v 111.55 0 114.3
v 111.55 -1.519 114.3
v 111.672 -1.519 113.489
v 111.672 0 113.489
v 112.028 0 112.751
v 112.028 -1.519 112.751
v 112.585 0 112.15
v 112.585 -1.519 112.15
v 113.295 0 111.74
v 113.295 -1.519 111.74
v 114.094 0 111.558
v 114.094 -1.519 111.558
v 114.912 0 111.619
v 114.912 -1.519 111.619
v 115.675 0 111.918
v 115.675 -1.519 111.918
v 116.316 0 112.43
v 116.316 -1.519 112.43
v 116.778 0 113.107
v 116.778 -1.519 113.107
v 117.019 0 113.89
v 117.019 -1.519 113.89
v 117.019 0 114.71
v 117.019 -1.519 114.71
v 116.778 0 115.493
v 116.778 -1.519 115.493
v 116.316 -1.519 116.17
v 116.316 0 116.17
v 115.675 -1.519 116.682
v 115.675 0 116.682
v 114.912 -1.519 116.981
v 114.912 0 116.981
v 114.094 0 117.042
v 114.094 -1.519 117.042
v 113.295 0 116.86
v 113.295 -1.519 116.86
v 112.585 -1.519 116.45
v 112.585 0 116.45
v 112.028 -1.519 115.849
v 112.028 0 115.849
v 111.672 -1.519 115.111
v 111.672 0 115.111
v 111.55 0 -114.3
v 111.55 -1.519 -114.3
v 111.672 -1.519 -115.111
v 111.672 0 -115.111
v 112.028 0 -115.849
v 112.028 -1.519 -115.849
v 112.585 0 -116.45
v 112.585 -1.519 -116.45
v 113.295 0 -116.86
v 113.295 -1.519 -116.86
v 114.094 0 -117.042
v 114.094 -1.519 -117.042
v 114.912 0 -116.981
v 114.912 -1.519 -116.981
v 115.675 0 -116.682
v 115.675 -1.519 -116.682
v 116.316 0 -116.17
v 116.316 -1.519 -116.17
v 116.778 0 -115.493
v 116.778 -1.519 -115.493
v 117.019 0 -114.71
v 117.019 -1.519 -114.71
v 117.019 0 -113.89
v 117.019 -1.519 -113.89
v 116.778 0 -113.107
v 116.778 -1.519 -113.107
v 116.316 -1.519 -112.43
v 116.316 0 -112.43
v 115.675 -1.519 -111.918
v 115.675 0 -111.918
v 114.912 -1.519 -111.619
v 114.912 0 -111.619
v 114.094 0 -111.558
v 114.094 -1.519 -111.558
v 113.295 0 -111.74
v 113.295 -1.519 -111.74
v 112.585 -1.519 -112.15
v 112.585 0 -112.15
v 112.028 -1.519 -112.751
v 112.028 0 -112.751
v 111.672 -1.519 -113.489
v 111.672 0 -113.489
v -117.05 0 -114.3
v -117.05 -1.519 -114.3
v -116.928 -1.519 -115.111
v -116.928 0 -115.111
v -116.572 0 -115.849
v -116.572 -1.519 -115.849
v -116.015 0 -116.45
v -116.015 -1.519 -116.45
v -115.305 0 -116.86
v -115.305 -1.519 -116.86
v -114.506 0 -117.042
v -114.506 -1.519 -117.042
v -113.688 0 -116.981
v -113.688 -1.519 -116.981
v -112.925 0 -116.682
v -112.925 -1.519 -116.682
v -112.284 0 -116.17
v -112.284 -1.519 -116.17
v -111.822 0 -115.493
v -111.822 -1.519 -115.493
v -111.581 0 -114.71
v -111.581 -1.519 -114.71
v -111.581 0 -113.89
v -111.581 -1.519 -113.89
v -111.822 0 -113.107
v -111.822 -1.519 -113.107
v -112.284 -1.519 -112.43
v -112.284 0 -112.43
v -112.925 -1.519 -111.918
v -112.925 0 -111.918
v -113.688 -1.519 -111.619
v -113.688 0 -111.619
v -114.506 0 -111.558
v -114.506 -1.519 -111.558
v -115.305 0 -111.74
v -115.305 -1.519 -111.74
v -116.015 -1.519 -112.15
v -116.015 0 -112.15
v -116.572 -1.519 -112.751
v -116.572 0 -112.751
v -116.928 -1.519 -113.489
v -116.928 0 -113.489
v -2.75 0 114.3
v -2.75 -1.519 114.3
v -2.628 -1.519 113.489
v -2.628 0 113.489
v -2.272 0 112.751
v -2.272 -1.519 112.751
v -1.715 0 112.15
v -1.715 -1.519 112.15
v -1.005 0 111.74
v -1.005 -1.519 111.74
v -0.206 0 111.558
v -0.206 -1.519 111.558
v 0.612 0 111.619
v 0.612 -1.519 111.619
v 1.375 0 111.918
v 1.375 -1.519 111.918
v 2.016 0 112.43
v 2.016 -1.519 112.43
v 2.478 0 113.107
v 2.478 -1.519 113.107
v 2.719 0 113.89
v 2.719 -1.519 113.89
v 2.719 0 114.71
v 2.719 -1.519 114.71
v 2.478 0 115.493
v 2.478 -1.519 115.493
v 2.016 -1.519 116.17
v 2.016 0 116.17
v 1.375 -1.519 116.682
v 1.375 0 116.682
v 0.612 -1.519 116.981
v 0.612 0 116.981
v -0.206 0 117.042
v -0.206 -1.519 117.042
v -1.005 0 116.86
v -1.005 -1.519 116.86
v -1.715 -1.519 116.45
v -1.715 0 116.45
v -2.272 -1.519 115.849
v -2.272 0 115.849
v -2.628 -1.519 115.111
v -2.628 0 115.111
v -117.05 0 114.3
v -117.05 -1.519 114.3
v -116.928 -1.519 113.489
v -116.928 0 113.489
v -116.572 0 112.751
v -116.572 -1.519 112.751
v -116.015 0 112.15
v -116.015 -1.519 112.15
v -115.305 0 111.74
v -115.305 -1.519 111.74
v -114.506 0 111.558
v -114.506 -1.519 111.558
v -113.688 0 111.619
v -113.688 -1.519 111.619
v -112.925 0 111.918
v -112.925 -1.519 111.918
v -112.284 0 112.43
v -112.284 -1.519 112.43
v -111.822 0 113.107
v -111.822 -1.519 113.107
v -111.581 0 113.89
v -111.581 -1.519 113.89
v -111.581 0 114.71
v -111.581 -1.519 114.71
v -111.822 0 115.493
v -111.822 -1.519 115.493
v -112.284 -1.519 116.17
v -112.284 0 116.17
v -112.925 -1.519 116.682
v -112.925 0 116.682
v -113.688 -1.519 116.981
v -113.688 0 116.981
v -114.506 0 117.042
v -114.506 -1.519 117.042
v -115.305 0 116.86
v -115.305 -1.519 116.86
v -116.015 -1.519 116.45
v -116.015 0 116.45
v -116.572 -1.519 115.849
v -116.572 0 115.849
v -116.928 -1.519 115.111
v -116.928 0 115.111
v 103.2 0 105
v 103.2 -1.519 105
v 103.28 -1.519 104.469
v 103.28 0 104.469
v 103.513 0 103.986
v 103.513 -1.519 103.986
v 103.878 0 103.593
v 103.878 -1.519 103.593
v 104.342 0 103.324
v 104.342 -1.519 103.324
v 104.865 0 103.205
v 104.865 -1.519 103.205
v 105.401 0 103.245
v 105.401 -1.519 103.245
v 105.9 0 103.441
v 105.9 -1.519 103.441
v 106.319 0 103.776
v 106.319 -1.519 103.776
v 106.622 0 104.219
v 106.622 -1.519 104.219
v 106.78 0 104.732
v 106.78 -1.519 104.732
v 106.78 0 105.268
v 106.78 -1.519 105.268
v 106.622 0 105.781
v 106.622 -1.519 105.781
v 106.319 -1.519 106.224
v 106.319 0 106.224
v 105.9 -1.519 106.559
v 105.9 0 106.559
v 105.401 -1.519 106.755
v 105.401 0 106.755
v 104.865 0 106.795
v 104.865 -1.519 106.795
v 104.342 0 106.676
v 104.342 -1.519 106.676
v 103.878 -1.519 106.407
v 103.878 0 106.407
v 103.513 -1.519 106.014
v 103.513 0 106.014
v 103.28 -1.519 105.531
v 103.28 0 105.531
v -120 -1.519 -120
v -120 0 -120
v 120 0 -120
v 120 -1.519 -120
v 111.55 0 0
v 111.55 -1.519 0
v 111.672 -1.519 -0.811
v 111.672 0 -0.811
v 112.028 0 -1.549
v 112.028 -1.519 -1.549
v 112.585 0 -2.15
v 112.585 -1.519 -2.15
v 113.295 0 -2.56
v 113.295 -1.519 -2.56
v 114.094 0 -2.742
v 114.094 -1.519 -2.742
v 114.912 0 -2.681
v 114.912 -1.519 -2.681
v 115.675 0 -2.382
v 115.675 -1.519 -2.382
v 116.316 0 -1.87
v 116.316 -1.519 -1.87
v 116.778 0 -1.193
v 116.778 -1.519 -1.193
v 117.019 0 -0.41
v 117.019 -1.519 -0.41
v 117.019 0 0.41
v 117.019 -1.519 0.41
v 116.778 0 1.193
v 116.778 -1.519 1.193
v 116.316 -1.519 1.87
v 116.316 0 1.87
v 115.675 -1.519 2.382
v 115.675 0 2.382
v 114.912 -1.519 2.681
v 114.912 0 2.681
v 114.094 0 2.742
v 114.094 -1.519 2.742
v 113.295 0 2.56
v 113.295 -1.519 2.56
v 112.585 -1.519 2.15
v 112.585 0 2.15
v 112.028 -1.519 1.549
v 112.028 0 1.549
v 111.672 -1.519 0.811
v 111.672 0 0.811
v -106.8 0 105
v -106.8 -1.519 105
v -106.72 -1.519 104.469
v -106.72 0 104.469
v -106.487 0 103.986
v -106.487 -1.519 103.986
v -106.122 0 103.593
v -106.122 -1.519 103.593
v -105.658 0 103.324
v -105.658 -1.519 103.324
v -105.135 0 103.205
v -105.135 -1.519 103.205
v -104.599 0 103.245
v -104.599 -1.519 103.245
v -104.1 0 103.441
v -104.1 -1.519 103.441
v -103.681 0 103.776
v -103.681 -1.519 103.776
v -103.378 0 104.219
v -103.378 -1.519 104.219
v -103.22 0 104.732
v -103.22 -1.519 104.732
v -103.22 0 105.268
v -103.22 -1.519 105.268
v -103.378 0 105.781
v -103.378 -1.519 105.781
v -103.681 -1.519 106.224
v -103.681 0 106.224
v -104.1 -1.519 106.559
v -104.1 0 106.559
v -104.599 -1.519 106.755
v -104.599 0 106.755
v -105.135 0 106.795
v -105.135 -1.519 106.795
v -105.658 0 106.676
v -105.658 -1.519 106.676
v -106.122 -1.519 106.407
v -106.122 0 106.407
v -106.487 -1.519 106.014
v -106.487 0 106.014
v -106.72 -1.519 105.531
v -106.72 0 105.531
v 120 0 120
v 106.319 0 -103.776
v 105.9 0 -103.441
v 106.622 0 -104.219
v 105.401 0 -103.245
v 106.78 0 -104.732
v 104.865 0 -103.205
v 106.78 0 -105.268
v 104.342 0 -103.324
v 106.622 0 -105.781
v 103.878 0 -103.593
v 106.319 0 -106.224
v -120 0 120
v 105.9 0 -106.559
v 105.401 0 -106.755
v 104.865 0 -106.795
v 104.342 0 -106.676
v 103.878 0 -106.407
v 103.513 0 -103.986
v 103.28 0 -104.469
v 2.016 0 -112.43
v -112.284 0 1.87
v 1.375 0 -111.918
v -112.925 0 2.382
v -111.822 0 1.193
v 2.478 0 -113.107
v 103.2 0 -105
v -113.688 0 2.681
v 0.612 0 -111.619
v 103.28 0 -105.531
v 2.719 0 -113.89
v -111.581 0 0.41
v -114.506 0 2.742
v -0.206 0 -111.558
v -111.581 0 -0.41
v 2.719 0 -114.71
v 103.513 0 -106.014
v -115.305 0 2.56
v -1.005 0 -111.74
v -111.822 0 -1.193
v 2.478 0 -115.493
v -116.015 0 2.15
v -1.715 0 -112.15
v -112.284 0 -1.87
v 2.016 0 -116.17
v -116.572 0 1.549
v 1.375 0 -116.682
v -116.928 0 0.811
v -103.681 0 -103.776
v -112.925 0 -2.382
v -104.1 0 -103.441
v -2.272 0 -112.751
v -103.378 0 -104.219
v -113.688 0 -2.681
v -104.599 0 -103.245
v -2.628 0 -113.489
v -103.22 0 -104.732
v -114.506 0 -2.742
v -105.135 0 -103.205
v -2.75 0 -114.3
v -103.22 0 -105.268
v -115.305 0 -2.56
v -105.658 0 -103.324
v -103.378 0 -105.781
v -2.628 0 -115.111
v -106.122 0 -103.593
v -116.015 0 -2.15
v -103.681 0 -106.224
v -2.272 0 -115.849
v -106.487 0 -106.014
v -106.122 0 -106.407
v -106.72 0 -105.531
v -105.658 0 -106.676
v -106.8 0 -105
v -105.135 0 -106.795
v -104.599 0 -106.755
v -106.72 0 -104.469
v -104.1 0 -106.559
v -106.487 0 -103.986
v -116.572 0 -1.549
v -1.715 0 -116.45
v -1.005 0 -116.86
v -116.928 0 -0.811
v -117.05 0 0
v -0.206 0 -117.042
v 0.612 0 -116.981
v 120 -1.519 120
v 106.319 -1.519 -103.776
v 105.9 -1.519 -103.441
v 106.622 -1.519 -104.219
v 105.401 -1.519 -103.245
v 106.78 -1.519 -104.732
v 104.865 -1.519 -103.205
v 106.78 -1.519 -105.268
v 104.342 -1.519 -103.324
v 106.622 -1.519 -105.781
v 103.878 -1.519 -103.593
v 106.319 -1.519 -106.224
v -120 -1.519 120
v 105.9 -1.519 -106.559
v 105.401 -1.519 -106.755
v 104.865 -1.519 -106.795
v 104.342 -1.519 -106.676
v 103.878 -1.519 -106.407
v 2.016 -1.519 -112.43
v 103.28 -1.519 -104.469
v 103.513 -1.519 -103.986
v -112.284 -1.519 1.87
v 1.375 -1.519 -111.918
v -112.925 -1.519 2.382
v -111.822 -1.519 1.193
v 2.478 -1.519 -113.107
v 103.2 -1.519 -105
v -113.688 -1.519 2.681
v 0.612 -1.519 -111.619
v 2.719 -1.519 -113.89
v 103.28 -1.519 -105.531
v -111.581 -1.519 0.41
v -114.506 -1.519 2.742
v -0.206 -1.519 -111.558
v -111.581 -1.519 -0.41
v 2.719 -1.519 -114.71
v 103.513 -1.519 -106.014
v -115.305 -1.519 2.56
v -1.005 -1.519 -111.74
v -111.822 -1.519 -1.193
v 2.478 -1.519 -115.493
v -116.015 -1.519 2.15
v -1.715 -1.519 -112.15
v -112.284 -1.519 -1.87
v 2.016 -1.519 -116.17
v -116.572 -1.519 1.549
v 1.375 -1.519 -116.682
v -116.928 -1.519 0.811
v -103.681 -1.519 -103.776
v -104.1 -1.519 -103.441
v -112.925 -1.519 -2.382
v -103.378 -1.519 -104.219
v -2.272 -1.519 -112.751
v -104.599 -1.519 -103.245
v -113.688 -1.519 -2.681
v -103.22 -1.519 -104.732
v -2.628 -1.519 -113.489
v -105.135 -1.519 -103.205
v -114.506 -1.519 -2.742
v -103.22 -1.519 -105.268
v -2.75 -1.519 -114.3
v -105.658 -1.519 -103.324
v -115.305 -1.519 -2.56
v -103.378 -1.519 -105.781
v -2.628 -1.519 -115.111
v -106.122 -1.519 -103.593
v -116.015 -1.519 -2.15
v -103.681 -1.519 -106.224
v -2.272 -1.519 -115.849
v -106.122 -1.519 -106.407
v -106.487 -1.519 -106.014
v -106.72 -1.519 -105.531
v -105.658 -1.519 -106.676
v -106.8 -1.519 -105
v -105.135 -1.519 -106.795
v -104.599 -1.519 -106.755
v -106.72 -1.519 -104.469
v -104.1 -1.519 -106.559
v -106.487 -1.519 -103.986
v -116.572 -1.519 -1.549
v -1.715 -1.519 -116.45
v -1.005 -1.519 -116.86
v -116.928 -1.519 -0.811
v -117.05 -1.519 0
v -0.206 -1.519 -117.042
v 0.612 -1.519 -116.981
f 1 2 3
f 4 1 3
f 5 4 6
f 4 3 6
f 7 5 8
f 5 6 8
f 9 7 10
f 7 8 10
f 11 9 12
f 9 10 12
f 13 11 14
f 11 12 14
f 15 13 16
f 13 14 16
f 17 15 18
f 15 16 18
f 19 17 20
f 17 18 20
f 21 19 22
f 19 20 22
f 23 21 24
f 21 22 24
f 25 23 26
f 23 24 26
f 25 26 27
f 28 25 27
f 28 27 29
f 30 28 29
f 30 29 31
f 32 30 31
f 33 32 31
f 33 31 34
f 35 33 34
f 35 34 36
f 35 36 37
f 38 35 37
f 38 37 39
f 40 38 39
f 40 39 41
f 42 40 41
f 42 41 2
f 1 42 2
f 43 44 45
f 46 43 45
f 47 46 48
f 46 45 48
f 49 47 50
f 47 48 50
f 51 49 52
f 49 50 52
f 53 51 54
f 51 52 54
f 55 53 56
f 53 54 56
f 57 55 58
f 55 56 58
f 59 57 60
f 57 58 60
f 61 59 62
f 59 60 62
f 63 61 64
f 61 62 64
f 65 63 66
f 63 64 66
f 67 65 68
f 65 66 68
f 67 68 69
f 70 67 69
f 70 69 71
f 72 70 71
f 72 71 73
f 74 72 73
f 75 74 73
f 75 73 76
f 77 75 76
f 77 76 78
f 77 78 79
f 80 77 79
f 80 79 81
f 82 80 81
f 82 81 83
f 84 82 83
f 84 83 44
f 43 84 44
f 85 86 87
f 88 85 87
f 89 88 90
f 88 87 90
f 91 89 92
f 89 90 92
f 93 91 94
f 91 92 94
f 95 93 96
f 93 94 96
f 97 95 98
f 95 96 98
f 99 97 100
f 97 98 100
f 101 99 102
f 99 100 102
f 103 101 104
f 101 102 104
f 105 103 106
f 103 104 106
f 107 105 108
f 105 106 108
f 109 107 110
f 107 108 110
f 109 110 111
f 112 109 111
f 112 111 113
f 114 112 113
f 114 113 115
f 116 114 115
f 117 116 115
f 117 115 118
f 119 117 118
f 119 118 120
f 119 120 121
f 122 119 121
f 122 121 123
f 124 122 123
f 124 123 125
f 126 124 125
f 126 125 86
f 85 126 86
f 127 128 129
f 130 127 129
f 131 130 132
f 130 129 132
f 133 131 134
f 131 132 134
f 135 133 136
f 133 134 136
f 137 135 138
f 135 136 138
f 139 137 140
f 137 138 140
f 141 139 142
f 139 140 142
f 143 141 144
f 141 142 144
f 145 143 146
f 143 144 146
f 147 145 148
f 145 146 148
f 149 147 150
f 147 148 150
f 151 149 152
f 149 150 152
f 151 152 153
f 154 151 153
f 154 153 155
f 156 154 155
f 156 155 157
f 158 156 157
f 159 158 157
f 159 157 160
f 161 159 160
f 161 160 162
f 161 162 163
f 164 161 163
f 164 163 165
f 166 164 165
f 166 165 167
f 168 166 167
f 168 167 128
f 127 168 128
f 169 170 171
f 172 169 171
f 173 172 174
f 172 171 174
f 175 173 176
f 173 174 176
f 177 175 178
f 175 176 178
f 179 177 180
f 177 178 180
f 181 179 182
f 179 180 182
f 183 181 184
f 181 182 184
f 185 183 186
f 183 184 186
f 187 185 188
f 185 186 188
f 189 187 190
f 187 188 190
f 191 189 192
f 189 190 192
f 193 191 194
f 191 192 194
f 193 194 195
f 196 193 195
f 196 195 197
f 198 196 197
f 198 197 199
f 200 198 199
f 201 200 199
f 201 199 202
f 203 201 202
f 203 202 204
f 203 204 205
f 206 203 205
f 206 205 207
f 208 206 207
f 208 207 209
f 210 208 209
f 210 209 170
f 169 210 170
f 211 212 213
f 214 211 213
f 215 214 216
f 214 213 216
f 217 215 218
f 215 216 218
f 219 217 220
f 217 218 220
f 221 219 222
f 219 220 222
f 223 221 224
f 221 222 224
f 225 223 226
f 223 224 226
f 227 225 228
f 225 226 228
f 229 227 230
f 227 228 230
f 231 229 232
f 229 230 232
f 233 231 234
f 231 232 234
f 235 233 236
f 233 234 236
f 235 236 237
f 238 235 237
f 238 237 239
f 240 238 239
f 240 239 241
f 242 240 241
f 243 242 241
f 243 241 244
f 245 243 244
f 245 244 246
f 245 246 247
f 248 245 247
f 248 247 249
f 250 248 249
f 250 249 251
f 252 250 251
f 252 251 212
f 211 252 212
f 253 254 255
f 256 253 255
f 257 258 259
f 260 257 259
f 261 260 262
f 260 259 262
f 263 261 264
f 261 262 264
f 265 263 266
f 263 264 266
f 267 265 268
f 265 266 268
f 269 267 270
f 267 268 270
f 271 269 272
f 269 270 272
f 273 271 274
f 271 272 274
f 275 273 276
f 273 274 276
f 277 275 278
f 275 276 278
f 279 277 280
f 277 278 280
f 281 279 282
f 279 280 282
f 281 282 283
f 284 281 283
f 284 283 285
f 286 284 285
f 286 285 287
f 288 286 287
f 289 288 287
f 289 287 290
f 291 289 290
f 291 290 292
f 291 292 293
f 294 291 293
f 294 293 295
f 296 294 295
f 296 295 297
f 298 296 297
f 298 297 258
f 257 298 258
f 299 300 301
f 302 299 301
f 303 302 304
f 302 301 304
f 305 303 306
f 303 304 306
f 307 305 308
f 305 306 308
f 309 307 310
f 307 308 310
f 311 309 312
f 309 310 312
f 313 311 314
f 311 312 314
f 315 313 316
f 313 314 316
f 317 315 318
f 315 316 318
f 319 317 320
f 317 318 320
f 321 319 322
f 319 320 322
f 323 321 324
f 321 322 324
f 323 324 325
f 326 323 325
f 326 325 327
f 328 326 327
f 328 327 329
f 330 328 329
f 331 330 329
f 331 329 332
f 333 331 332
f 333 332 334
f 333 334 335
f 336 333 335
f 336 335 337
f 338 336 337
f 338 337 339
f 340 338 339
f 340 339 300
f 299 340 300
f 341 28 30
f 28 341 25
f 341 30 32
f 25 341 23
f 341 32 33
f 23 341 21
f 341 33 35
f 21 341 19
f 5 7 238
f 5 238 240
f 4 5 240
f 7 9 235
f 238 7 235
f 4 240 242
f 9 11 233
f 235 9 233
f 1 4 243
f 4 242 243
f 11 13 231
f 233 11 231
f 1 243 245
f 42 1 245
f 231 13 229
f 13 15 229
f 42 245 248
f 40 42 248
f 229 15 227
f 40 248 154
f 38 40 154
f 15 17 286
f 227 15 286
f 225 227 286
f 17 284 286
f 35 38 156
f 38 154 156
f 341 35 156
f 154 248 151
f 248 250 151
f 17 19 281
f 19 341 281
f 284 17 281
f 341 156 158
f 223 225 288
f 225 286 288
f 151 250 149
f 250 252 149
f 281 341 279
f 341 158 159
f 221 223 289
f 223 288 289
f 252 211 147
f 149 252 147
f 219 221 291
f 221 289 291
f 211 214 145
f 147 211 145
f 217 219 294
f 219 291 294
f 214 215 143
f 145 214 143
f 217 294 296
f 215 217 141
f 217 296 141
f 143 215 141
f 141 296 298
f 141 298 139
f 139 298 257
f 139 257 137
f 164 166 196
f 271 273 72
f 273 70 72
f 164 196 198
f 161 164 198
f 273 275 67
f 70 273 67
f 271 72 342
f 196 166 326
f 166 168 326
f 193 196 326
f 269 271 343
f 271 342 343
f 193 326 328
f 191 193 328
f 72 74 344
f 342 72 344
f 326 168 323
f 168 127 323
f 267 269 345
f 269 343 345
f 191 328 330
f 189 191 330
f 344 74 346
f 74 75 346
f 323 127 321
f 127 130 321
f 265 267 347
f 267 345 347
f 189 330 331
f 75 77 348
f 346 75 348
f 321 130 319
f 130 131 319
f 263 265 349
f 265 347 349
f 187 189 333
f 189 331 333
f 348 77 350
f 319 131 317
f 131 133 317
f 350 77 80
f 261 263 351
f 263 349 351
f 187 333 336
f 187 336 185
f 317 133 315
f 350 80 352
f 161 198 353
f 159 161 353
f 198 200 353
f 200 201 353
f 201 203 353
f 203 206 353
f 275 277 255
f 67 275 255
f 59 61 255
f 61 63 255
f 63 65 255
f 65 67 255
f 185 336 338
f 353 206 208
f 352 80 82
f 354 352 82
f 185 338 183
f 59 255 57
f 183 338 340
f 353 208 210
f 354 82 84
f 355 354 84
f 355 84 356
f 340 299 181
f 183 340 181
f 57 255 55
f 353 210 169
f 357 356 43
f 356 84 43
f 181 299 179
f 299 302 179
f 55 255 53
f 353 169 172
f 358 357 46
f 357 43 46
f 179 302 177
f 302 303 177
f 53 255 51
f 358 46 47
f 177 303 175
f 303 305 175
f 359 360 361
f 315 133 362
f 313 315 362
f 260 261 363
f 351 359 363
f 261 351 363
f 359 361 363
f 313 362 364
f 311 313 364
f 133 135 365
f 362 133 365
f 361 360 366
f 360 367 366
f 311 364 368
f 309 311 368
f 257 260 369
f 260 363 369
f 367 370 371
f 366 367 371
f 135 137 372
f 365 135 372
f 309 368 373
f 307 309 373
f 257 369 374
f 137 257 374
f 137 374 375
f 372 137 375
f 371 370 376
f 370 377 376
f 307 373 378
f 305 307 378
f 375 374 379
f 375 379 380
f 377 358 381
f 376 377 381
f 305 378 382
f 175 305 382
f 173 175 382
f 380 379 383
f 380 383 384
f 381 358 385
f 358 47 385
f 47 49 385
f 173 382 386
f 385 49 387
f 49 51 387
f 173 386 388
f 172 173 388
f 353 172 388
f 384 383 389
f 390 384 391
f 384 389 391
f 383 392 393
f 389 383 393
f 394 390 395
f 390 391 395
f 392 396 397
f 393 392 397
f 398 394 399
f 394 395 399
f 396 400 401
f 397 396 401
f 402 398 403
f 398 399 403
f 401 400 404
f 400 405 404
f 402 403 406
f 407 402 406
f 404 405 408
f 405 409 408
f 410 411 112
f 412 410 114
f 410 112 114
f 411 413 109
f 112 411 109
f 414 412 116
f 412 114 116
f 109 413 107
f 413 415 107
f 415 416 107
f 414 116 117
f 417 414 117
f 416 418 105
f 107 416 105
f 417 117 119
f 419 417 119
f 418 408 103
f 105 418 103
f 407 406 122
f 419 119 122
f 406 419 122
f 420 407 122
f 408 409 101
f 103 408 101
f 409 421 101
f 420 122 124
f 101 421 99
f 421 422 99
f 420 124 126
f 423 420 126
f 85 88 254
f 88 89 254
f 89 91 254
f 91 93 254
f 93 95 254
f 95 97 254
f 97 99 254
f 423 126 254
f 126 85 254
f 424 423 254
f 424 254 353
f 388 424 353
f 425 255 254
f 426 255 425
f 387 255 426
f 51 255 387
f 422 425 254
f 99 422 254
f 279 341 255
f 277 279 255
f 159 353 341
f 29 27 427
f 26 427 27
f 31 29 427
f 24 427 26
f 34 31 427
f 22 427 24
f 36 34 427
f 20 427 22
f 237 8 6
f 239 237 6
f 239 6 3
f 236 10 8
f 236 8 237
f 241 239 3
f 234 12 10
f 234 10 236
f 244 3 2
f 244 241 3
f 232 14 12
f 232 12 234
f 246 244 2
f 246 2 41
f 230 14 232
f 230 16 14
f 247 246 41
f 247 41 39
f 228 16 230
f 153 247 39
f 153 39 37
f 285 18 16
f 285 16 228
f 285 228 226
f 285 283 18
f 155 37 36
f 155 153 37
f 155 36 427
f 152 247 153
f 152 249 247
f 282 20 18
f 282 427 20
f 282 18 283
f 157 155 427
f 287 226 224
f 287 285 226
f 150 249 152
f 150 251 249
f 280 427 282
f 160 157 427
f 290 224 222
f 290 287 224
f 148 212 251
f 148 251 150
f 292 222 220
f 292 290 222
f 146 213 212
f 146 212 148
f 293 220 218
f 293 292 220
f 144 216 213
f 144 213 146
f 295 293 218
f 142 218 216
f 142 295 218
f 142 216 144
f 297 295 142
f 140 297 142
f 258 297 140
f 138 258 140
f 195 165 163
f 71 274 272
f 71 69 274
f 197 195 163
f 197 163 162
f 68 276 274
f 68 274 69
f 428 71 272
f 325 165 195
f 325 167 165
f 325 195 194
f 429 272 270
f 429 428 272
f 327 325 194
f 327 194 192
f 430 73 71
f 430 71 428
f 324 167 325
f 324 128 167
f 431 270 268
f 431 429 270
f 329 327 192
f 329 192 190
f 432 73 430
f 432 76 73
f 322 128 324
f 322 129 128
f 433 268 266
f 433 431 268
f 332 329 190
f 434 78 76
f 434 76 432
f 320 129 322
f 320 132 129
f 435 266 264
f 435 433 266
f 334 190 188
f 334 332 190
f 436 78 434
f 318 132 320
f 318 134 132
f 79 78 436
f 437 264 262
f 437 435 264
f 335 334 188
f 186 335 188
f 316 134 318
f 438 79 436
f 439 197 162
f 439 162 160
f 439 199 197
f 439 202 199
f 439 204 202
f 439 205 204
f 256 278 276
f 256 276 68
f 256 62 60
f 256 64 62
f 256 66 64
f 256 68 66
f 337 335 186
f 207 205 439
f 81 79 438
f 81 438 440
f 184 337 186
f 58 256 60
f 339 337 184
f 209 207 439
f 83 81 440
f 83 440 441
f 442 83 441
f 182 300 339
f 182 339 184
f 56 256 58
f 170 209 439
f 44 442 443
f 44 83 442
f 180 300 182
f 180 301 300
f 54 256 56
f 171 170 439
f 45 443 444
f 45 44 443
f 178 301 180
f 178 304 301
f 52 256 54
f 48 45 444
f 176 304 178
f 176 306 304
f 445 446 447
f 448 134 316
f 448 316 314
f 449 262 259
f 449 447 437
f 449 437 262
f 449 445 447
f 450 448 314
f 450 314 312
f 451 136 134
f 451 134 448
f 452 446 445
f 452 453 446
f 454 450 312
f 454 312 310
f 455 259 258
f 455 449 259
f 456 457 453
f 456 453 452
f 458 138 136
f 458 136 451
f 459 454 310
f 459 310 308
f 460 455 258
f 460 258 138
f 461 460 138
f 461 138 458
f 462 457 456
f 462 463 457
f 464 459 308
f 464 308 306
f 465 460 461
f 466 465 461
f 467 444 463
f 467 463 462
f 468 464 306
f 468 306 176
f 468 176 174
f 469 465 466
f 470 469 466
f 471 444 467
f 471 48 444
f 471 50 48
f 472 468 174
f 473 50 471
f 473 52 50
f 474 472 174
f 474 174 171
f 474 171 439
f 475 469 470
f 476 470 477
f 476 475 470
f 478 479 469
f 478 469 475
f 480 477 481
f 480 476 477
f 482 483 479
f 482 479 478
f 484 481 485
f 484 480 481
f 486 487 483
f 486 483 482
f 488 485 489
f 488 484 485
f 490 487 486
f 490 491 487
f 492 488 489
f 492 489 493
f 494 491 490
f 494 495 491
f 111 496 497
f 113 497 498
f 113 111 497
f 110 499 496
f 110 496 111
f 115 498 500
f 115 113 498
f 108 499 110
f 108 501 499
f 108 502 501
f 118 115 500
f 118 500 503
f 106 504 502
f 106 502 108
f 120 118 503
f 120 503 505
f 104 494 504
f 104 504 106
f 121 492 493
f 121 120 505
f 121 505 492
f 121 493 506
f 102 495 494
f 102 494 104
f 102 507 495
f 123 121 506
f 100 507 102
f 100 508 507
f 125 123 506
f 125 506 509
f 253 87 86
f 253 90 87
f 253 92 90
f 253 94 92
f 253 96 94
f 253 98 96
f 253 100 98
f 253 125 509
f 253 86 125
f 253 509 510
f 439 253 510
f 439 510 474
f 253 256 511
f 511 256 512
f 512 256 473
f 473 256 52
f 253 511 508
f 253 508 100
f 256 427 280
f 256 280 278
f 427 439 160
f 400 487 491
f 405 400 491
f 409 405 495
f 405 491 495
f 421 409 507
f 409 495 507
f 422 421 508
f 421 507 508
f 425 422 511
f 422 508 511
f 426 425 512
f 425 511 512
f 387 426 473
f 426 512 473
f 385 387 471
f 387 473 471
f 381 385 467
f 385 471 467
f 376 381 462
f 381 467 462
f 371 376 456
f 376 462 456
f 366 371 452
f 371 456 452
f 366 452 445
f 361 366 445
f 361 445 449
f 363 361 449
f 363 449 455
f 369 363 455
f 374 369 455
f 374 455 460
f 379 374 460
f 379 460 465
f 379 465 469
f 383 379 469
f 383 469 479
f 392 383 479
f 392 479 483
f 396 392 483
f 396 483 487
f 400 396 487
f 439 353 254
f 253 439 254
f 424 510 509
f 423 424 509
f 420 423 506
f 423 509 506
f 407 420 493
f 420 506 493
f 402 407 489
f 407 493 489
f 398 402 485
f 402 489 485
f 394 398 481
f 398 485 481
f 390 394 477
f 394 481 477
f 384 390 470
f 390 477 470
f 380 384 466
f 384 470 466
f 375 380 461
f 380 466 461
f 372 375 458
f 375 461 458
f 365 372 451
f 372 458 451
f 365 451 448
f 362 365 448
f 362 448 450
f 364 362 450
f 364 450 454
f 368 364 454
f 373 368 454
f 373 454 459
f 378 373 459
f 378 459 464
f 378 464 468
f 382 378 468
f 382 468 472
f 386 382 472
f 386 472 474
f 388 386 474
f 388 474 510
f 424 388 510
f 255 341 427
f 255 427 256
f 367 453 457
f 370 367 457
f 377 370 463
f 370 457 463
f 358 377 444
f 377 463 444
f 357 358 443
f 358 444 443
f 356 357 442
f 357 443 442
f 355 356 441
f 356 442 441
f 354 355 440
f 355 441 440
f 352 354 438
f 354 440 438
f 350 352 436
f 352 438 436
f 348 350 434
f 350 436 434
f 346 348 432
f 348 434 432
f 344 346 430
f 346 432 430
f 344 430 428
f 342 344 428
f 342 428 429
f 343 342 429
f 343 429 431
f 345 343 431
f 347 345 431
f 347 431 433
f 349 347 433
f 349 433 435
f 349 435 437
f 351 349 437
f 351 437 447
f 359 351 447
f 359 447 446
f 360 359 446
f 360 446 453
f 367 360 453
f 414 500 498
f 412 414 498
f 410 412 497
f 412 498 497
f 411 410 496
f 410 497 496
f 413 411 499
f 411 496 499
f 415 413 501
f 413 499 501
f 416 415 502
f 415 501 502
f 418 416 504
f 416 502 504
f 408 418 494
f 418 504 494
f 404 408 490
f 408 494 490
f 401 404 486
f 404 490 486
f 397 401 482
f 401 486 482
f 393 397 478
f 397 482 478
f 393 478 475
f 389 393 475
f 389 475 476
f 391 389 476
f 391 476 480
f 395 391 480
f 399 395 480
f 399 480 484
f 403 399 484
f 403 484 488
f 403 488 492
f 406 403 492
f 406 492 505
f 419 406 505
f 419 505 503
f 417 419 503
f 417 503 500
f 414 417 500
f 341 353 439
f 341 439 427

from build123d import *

# Parameters (mm, degrees)
SKETCH1_W            = 350
SKETCH1_H            = 347
BASE_FLANGE1_DEPTH   = 1.51892
M3_CLEARANCE_HOLE1_D = 3.6
M4_CLEARANCE_HOLE1_D = 4.8
SKETCH13_R           = 8.5
SKETCH13_R_2         = 1.375
CUT_EXTRUDE1_DEPTH   = 1.51892
SKETCH41_W           = 347
SKETCH41_H           = 1.51892
BOSS_EXTRUDE4_DEPTH  = 1.905
SKETCH42_W           = 347
SKETCH42_H           = 1.51892
BOSS_EXTRUDE5_DEPTH  = 1.905
CUT_EXTRUDE2_DEPTH   = 1.51892
BOSS_EXTRUDE6_DEPTH  = 1.51892
CLEARANCE_HOLE2_D    = 3.4
FILLET2_R            = 5
SKETCH50_OUTSIDE_W   = 455.91
SKETCH50_OUTSIDE_H   = 456.1
SKETCH50_OUTSIDE_W_2 = 240
SKETCH50_OUTSIDE_H_2 = 240
CUT_EXTRUDE3_DEPTH   = 1.51892
M5_CLEARANCE_HOLE1_D = 5.5


# Sheet-metal steps are written as plain solids
with BuildPart() as part:
    # Sketch1 → Base-Flange1 (new body)
    with BuildSketch(Plane(origin=(0, 0, 0), x_dir=(1, 0, 0), z_dir=(0, 1, 0))):
        with Locations((0, 13.5)):
            Rectangle(SKETCH1_W, SKETCH1_H)
    extrude(amount=-BASE_FLANGE1_DEPTH)

    # M3 Clearance Hole1 (through all)
    with Locations(Plane(origin=(0, 0, 0), x_dir=(1, 0, 0), z_dir=(0, 1, 0))):
        with Locations((-105, 105), (105, 105), (105, -105), (-105, -105)):
            Hole(M3_CLEARANCE_HOLE1_D / 2)

    # M4 Clearance Hole1 (through all)
    with Locations(Plane(origin=(0, -1.51892, 0), x_dir=(-1, 0, 0), z_dir=(0, -1, 0))):
        with Locations((167.5, 146.5), (167.5, 169), (-167.5, 146.5), (-167.5, 169), (-167.5, -149), (-167.5, -126.5), (167.5, -149), (167.5, -126.5)):
            Hole(M4_CLEARANCE_HOLE1_D / 2)

    # Sketch13 → Cut-Extrude1 (cut)
    with BuildSketch(Plane(origin=(0, 0, 0), x_dir=(1, 0, 0), z_dir=(0, 1, 0))):
        with Locations(Location((0, 170, 0), (0, 0, 270))):
            Circle(SKETCH13_R)
        with Locations(Location((-11.825, 170, 0), (0, 0, 270))):
            Circle(SKETCH13_R_2)
        with Locations(Location((11.825, 170, 0), (0, 0, 270))):
            Circle(SKETCH13_R_2)
    extrude(amount=-CUT_EXTRUDE1_DEPTH, mode=Mode.SUBTRACT)

    # Sketch41 → Boss-Extrude4 (add)
    with BuildSketch(Plane(origin=(175, 0, 0), x_dir=(0, 0, -1), z_dir=(1, 0, 0))):
        with Locations((13.5, -0.75946)):
            Rectangle(SKETCH41_W, SKETCH41_H)
    extrude(amount=BOSS_EXTRUDE4_DEPTH)

    # Sketch42 → Boss-Extrude5 (add)
    with BuildSketch(Plane.ZY.offset(175)):
        with Locations((-13.5, -0.75946)):
            Rectangle(SKETCH42_W, SKETCH42_H)
    extrude(amount=BOSS_EXTRUDE5_DEPTH)

    # Sketch43 → Cut-Extrude2 (cut)
    with BuildSketch(Plane(origin=(0, 0, 0), x_dir=(1, 0, 0), z_dir=(0, 1, 0))):
        Polygon((-176.905, -120), (-120, -63.095), (-120, 80.095), (-176.905, 137), align=None)
        Polygon((-156.905, 177), (-99.905, 120), (-42.952595893, 120), (-25, 187), (-176.905, 187), (-176.905, 177), align=None)
        Polygon((25, 187), (42.952595893, 120), (99.905, 120), (156.905, 177), (176.905, 177), (176.905, 187), align=None)
        Polygon((120, 80.095), (120, -63.095), (176.905, -120), (176.905, 137), align=None)
        Polygon((116.905, -120), (-116.905, -120), (-156.905, -160), (156.905, -160), align=None)
    extrude(amount=-CUT_EXTRUDE2_DEPTH, mode=Mode.SUBTRACT)

    # Sketch45 → Boss-Extrude6 (add)
    with BuildSketch(Plane(origin=(0, 0, 0), x_dir=(1, 0, 0), z_dir=(0, 1, 0))):
        Polygon((-25, 187), (-23.124355653, 194), (23.124355653, 194), (25, 187), align=None)
    extrude(amount=-BOSS_EXTRUDE6_DEPTH)

    # Clearance Hole2 (through all)
    with Locations(Plane(origin=(0, 0, 0), x_dir=(1, 0, 0), z_dir=(0, 1, 0))):
        with Locations((-9.525, 188), (9.525, 188)):
            Hole(CLEARANCE_HOLE2_D / 2)

    # Fillet2
    fillet2_edges = [part.edges().sort_by_distance(p)[0] for p in [
        (176.905, -0.75946, 160),
        (-176.905, -0.75946, 160),
        (176.905, -0.75946, -177),
        (42.952595893, -0.75946, -120),
        (99.905, -0.75946, -120),
        (156.905, -0.75946, -177),
        (176.905, -0.75946, 120),
        (176.905, -0.75946, -137),
        (120, -0.75946, -80.095),
        (120, -0.75946, 63.095),
        (-176.905, -0.75946, -137),
        (-176.905, -0.75946, 120),
        (-120, -0.75946, 63.095),
        (-120, -0.75946, -80.095),
        (-176.905, -0.75946, -177),
        (-156.905, -0.75946, -177),
        (-99.905, -0.75946, -120),
        (-42.952595893, -0.75946, -120),
        (-156.905, -0.75946, 160),
        (156.905, -0.75946, 160),
        (116.905, -0.75946, 120),
        (-116.905, -0.75946, 120),
        (-23.124355653, -0.75946, -194),
        (23.124355653, -0.75946, -194),
    ]]
    fillet(fillet2_edges, radius=FILLET2_R)

    # Sketch50 outside → Cut-Extrude3 (cut)
    with BuildSketch(Plane(origin=(0, 0, 0), x_dir=(1, 0, 0), z_dir=(0, 1, 0))):
        with Locations((0, 17)):
            Rectangle(SKETCH50_OUTSIDE_W, SKETCH50_OUTSIDE_H)
        Rectangle(SKETCH50_OUTSIDE_W_2, SKETCH50_OUTSIDE_H_2, mode=Mode.SUBTRACT)
    extrude(amount=-CUT_EXTRUDE3_DEPTH, mode=Mode.SUBTRACT)

    # M5 Clearance Hole1 (through all)
    with Locations(Plane(origin=(0, 0, 0), x_dir=(1, 0, 0), z_dir=(0, 1, 0))):
        with Locations((-114.3, 114.3), (114.3, 114.3), (114.3, -114.3), (-114.3, -114.3), (-114.3, 0), (0, 114.3), (114.3, 0), (0, -114.3)):
            Hole(M5_CLEARANCE_HOLE1_D / 2)


solid = part.part
